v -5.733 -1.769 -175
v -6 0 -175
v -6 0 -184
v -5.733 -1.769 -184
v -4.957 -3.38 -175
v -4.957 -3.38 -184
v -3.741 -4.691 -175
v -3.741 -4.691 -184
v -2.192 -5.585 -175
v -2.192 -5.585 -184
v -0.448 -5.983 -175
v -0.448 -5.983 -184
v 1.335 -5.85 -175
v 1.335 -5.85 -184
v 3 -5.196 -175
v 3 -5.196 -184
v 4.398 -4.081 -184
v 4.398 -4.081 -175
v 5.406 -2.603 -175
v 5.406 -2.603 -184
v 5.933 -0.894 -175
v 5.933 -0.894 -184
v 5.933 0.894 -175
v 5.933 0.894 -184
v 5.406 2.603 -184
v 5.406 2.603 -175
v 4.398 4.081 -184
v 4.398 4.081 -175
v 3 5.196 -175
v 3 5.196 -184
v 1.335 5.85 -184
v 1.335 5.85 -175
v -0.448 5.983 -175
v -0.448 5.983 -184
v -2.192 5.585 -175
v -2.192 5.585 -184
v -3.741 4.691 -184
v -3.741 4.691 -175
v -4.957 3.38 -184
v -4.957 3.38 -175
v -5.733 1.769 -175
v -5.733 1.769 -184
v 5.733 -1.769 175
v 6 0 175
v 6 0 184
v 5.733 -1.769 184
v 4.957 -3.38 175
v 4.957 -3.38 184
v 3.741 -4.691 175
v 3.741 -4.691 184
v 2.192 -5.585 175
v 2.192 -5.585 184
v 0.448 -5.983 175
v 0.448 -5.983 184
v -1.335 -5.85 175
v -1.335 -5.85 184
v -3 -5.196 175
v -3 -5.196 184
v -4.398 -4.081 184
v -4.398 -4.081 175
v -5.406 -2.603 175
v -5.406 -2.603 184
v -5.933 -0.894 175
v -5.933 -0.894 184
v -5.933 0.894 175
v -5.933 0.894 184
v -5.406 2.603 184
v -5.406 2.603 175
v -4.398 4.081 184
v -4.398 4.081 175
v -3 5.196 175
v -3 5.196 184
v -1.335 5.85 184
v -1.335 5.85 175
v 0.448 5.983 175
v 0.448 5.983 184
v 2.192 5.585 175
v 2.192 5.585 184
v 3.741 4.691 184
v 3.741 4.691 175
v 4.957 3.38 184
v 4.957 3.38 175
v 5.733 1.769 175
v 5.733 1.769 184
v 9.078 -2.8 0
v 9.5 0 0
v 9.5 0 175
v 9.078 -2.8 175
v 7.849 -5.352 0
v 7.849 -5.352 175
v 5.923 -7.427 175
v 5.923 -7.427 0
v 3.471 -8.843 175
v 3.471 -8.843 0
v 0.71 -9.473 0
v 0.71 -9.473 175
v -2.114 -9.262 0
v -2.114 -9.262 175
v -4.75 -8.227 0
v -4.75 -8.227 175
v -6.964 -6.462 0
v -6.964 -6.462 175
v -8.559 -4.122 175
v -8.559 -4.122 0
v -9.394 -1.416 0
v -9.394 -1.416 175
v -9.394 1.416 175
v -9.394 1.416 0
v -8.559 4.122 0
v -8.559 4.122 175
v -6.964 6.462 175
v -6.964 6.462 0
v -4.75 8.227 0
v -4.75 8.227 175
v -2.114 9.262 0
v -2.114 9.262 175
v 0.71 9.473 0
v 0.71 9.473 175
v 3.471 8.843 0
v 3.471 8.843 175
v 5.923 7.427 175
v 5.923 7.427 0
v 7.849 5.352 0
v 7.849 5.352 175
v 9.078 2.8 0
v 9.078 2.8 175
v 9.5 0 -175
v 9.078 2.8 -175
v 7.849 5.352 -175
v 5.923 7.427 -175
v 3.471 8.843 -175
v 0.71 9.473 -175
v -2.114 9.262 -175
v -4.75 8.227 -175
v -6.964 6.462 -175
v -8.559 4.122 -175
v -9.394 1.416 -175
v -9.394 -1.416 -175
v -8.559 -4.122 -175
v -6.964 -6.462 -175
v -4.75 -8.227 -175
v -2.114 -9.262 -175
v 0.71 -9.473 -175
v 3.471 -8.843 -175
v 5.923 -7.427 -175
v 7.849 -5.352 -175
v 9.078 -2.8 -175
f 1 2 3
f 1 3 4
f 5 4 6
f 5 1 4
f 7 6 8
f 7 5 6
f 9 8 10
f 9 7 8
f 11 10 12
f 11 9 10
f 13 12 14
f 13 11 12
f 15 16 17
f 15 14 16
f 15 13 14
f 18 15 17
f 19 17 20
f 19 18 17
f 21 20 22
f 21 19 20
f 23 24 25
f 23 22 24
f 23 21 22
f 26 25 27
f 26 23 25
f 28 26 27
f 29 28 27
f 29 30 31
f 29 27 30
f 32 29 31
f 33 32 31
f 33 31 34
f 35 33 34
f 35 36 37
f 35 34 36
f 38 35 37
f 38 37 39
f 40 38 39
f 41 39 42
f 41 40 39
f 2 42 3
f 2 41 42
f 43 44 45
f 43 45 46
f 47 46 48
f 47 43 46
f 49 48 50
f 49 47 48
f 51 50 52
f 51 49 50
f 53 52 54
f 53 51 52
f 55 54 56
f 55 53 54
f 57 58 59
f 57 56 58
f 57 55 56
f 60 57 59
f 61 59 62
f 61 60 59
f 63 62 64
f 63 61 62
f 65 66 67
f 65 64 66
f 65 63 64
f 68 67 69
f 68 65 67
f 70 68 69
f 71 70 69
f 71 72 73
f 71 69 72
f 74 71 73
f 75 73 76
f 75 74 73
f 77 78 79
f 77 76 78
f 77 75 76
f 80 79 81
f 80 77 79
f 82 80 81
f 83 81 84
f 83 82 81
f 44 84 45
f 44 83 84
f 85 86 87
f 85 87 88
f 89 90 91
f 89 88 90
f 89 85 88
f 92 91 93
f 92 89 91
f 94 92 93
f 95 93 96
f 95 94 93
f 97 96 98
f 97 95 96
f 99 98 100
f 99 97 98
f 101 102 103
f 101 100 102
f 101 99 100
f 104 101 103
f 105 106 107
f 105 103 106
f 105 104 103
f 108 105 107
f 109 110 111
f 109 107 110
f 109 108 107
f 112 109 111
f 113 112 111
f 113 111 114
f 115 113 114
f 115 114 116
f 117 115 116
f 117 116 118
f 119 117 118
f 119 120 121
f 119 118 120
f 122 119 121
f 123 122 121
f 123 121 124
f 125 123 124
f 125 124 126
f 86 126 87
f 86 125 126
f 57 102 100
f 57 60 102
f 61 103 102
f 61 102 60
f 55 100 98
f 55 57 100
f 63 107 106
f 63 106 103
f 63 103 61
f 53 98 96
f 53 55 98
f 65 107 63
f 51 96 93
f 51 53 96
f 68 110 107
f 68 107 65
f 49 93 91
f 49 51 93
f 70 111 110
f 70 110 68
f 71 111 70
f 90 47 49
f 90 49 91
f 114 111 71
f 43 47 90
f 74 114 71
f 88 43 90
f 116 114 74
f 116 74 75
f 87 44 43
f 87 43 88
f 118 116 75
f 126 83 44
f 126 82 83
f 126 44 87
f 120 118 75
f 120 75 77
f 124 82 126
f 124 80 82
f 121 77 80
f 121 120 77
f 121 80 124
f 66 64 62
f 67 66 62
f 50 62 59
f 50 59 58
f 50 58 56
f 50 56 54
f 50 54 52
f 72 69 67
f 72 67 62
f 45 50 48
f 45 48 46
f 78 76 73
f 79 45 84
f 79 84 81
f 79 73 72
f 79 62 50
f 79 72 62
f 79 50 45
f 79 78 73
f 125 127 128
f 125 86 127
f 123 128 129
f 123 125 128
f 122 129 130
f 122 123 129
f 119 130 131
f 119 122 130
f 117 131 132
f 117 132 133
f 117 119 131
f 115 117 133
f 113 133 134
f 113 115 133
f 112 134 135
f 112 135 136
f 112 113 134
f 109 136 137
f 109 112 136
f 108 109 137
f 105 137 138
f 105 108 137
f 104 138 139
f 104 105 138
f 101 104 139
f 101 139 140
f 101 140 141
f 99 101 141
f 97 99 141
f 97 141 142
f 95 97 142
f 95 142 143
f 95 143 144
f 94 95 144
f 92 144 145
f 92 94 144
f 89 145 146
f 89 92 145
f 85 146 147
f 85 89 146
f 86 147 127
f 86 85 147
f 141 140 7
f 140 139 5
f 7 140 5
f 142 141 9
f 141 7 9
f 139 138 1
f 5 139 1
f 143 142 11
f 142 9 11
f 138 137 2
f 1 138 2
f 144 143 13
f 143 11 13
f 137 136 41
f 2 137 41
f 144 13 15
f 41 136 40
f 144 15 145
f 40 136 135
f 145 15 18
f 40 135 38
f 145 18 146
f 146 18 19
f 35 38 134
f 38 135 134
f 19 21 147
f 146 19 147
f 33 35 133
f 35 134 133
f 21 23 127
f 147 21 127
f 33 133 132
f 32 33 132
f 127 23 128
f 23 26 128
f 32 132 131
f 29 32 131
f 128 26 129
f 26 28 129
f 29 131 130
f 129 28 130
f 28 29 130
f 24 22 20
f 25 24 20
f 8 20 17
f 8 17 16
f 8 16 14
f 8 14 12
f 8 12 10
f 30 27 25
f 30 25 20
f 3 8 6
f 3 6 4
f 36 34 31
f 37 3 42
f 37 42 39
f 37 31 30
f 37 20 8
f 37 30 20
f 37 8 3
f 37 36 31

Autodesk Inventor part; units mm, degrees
ref_plane "YZ Plane" through (0, 0, 0) normal (1, 0, 0) x (0, 1, 0)
ref_plane "XZ Plane" through (0, 0, 0) normal (0, 1, 0) x (-1, 0, 0)
ref_plane "XY Plane" through (0, 0, 0) normal (0, 0, 1) x (1, 0, 0)
sketch "Sketch1" plane through (0, 0, 0) normal (0, 0, 1) x (1, 0, 0)
  circle A0 centre (0, 0) radius 9.5
  dimension "d0" = 19
extrude "Extrusion1" add sketch "Sketch1" along normal mid plane 350
sketch "Sketch2" plane through (0, 0, 175) normal (0, 0, 1) x (1, 0, 0)
  circle A0 centre (0, 0) radius 9.5 projected
  circle A1 centre (0, 0) radius 6
  dimension "d3" = 12
extrude "Extrusion2" add sketch "Sketch2" along normal blind 9 contours A1
sketch "Sketch3" plane through (0, 0, -175) normal (0, 0, -1) x (-1, 0, 0)
  circle A0 centre (0, 0) radius 9.5 projected
  circle A1 centre (0, 0) radius 6
  dimension "d6" = 12
extrude "Extrusion3" add sketch "Sketch3" along normal blind 9 contours A1
properties part number "ADSK-MH-10044" material "Steel, Mild"
